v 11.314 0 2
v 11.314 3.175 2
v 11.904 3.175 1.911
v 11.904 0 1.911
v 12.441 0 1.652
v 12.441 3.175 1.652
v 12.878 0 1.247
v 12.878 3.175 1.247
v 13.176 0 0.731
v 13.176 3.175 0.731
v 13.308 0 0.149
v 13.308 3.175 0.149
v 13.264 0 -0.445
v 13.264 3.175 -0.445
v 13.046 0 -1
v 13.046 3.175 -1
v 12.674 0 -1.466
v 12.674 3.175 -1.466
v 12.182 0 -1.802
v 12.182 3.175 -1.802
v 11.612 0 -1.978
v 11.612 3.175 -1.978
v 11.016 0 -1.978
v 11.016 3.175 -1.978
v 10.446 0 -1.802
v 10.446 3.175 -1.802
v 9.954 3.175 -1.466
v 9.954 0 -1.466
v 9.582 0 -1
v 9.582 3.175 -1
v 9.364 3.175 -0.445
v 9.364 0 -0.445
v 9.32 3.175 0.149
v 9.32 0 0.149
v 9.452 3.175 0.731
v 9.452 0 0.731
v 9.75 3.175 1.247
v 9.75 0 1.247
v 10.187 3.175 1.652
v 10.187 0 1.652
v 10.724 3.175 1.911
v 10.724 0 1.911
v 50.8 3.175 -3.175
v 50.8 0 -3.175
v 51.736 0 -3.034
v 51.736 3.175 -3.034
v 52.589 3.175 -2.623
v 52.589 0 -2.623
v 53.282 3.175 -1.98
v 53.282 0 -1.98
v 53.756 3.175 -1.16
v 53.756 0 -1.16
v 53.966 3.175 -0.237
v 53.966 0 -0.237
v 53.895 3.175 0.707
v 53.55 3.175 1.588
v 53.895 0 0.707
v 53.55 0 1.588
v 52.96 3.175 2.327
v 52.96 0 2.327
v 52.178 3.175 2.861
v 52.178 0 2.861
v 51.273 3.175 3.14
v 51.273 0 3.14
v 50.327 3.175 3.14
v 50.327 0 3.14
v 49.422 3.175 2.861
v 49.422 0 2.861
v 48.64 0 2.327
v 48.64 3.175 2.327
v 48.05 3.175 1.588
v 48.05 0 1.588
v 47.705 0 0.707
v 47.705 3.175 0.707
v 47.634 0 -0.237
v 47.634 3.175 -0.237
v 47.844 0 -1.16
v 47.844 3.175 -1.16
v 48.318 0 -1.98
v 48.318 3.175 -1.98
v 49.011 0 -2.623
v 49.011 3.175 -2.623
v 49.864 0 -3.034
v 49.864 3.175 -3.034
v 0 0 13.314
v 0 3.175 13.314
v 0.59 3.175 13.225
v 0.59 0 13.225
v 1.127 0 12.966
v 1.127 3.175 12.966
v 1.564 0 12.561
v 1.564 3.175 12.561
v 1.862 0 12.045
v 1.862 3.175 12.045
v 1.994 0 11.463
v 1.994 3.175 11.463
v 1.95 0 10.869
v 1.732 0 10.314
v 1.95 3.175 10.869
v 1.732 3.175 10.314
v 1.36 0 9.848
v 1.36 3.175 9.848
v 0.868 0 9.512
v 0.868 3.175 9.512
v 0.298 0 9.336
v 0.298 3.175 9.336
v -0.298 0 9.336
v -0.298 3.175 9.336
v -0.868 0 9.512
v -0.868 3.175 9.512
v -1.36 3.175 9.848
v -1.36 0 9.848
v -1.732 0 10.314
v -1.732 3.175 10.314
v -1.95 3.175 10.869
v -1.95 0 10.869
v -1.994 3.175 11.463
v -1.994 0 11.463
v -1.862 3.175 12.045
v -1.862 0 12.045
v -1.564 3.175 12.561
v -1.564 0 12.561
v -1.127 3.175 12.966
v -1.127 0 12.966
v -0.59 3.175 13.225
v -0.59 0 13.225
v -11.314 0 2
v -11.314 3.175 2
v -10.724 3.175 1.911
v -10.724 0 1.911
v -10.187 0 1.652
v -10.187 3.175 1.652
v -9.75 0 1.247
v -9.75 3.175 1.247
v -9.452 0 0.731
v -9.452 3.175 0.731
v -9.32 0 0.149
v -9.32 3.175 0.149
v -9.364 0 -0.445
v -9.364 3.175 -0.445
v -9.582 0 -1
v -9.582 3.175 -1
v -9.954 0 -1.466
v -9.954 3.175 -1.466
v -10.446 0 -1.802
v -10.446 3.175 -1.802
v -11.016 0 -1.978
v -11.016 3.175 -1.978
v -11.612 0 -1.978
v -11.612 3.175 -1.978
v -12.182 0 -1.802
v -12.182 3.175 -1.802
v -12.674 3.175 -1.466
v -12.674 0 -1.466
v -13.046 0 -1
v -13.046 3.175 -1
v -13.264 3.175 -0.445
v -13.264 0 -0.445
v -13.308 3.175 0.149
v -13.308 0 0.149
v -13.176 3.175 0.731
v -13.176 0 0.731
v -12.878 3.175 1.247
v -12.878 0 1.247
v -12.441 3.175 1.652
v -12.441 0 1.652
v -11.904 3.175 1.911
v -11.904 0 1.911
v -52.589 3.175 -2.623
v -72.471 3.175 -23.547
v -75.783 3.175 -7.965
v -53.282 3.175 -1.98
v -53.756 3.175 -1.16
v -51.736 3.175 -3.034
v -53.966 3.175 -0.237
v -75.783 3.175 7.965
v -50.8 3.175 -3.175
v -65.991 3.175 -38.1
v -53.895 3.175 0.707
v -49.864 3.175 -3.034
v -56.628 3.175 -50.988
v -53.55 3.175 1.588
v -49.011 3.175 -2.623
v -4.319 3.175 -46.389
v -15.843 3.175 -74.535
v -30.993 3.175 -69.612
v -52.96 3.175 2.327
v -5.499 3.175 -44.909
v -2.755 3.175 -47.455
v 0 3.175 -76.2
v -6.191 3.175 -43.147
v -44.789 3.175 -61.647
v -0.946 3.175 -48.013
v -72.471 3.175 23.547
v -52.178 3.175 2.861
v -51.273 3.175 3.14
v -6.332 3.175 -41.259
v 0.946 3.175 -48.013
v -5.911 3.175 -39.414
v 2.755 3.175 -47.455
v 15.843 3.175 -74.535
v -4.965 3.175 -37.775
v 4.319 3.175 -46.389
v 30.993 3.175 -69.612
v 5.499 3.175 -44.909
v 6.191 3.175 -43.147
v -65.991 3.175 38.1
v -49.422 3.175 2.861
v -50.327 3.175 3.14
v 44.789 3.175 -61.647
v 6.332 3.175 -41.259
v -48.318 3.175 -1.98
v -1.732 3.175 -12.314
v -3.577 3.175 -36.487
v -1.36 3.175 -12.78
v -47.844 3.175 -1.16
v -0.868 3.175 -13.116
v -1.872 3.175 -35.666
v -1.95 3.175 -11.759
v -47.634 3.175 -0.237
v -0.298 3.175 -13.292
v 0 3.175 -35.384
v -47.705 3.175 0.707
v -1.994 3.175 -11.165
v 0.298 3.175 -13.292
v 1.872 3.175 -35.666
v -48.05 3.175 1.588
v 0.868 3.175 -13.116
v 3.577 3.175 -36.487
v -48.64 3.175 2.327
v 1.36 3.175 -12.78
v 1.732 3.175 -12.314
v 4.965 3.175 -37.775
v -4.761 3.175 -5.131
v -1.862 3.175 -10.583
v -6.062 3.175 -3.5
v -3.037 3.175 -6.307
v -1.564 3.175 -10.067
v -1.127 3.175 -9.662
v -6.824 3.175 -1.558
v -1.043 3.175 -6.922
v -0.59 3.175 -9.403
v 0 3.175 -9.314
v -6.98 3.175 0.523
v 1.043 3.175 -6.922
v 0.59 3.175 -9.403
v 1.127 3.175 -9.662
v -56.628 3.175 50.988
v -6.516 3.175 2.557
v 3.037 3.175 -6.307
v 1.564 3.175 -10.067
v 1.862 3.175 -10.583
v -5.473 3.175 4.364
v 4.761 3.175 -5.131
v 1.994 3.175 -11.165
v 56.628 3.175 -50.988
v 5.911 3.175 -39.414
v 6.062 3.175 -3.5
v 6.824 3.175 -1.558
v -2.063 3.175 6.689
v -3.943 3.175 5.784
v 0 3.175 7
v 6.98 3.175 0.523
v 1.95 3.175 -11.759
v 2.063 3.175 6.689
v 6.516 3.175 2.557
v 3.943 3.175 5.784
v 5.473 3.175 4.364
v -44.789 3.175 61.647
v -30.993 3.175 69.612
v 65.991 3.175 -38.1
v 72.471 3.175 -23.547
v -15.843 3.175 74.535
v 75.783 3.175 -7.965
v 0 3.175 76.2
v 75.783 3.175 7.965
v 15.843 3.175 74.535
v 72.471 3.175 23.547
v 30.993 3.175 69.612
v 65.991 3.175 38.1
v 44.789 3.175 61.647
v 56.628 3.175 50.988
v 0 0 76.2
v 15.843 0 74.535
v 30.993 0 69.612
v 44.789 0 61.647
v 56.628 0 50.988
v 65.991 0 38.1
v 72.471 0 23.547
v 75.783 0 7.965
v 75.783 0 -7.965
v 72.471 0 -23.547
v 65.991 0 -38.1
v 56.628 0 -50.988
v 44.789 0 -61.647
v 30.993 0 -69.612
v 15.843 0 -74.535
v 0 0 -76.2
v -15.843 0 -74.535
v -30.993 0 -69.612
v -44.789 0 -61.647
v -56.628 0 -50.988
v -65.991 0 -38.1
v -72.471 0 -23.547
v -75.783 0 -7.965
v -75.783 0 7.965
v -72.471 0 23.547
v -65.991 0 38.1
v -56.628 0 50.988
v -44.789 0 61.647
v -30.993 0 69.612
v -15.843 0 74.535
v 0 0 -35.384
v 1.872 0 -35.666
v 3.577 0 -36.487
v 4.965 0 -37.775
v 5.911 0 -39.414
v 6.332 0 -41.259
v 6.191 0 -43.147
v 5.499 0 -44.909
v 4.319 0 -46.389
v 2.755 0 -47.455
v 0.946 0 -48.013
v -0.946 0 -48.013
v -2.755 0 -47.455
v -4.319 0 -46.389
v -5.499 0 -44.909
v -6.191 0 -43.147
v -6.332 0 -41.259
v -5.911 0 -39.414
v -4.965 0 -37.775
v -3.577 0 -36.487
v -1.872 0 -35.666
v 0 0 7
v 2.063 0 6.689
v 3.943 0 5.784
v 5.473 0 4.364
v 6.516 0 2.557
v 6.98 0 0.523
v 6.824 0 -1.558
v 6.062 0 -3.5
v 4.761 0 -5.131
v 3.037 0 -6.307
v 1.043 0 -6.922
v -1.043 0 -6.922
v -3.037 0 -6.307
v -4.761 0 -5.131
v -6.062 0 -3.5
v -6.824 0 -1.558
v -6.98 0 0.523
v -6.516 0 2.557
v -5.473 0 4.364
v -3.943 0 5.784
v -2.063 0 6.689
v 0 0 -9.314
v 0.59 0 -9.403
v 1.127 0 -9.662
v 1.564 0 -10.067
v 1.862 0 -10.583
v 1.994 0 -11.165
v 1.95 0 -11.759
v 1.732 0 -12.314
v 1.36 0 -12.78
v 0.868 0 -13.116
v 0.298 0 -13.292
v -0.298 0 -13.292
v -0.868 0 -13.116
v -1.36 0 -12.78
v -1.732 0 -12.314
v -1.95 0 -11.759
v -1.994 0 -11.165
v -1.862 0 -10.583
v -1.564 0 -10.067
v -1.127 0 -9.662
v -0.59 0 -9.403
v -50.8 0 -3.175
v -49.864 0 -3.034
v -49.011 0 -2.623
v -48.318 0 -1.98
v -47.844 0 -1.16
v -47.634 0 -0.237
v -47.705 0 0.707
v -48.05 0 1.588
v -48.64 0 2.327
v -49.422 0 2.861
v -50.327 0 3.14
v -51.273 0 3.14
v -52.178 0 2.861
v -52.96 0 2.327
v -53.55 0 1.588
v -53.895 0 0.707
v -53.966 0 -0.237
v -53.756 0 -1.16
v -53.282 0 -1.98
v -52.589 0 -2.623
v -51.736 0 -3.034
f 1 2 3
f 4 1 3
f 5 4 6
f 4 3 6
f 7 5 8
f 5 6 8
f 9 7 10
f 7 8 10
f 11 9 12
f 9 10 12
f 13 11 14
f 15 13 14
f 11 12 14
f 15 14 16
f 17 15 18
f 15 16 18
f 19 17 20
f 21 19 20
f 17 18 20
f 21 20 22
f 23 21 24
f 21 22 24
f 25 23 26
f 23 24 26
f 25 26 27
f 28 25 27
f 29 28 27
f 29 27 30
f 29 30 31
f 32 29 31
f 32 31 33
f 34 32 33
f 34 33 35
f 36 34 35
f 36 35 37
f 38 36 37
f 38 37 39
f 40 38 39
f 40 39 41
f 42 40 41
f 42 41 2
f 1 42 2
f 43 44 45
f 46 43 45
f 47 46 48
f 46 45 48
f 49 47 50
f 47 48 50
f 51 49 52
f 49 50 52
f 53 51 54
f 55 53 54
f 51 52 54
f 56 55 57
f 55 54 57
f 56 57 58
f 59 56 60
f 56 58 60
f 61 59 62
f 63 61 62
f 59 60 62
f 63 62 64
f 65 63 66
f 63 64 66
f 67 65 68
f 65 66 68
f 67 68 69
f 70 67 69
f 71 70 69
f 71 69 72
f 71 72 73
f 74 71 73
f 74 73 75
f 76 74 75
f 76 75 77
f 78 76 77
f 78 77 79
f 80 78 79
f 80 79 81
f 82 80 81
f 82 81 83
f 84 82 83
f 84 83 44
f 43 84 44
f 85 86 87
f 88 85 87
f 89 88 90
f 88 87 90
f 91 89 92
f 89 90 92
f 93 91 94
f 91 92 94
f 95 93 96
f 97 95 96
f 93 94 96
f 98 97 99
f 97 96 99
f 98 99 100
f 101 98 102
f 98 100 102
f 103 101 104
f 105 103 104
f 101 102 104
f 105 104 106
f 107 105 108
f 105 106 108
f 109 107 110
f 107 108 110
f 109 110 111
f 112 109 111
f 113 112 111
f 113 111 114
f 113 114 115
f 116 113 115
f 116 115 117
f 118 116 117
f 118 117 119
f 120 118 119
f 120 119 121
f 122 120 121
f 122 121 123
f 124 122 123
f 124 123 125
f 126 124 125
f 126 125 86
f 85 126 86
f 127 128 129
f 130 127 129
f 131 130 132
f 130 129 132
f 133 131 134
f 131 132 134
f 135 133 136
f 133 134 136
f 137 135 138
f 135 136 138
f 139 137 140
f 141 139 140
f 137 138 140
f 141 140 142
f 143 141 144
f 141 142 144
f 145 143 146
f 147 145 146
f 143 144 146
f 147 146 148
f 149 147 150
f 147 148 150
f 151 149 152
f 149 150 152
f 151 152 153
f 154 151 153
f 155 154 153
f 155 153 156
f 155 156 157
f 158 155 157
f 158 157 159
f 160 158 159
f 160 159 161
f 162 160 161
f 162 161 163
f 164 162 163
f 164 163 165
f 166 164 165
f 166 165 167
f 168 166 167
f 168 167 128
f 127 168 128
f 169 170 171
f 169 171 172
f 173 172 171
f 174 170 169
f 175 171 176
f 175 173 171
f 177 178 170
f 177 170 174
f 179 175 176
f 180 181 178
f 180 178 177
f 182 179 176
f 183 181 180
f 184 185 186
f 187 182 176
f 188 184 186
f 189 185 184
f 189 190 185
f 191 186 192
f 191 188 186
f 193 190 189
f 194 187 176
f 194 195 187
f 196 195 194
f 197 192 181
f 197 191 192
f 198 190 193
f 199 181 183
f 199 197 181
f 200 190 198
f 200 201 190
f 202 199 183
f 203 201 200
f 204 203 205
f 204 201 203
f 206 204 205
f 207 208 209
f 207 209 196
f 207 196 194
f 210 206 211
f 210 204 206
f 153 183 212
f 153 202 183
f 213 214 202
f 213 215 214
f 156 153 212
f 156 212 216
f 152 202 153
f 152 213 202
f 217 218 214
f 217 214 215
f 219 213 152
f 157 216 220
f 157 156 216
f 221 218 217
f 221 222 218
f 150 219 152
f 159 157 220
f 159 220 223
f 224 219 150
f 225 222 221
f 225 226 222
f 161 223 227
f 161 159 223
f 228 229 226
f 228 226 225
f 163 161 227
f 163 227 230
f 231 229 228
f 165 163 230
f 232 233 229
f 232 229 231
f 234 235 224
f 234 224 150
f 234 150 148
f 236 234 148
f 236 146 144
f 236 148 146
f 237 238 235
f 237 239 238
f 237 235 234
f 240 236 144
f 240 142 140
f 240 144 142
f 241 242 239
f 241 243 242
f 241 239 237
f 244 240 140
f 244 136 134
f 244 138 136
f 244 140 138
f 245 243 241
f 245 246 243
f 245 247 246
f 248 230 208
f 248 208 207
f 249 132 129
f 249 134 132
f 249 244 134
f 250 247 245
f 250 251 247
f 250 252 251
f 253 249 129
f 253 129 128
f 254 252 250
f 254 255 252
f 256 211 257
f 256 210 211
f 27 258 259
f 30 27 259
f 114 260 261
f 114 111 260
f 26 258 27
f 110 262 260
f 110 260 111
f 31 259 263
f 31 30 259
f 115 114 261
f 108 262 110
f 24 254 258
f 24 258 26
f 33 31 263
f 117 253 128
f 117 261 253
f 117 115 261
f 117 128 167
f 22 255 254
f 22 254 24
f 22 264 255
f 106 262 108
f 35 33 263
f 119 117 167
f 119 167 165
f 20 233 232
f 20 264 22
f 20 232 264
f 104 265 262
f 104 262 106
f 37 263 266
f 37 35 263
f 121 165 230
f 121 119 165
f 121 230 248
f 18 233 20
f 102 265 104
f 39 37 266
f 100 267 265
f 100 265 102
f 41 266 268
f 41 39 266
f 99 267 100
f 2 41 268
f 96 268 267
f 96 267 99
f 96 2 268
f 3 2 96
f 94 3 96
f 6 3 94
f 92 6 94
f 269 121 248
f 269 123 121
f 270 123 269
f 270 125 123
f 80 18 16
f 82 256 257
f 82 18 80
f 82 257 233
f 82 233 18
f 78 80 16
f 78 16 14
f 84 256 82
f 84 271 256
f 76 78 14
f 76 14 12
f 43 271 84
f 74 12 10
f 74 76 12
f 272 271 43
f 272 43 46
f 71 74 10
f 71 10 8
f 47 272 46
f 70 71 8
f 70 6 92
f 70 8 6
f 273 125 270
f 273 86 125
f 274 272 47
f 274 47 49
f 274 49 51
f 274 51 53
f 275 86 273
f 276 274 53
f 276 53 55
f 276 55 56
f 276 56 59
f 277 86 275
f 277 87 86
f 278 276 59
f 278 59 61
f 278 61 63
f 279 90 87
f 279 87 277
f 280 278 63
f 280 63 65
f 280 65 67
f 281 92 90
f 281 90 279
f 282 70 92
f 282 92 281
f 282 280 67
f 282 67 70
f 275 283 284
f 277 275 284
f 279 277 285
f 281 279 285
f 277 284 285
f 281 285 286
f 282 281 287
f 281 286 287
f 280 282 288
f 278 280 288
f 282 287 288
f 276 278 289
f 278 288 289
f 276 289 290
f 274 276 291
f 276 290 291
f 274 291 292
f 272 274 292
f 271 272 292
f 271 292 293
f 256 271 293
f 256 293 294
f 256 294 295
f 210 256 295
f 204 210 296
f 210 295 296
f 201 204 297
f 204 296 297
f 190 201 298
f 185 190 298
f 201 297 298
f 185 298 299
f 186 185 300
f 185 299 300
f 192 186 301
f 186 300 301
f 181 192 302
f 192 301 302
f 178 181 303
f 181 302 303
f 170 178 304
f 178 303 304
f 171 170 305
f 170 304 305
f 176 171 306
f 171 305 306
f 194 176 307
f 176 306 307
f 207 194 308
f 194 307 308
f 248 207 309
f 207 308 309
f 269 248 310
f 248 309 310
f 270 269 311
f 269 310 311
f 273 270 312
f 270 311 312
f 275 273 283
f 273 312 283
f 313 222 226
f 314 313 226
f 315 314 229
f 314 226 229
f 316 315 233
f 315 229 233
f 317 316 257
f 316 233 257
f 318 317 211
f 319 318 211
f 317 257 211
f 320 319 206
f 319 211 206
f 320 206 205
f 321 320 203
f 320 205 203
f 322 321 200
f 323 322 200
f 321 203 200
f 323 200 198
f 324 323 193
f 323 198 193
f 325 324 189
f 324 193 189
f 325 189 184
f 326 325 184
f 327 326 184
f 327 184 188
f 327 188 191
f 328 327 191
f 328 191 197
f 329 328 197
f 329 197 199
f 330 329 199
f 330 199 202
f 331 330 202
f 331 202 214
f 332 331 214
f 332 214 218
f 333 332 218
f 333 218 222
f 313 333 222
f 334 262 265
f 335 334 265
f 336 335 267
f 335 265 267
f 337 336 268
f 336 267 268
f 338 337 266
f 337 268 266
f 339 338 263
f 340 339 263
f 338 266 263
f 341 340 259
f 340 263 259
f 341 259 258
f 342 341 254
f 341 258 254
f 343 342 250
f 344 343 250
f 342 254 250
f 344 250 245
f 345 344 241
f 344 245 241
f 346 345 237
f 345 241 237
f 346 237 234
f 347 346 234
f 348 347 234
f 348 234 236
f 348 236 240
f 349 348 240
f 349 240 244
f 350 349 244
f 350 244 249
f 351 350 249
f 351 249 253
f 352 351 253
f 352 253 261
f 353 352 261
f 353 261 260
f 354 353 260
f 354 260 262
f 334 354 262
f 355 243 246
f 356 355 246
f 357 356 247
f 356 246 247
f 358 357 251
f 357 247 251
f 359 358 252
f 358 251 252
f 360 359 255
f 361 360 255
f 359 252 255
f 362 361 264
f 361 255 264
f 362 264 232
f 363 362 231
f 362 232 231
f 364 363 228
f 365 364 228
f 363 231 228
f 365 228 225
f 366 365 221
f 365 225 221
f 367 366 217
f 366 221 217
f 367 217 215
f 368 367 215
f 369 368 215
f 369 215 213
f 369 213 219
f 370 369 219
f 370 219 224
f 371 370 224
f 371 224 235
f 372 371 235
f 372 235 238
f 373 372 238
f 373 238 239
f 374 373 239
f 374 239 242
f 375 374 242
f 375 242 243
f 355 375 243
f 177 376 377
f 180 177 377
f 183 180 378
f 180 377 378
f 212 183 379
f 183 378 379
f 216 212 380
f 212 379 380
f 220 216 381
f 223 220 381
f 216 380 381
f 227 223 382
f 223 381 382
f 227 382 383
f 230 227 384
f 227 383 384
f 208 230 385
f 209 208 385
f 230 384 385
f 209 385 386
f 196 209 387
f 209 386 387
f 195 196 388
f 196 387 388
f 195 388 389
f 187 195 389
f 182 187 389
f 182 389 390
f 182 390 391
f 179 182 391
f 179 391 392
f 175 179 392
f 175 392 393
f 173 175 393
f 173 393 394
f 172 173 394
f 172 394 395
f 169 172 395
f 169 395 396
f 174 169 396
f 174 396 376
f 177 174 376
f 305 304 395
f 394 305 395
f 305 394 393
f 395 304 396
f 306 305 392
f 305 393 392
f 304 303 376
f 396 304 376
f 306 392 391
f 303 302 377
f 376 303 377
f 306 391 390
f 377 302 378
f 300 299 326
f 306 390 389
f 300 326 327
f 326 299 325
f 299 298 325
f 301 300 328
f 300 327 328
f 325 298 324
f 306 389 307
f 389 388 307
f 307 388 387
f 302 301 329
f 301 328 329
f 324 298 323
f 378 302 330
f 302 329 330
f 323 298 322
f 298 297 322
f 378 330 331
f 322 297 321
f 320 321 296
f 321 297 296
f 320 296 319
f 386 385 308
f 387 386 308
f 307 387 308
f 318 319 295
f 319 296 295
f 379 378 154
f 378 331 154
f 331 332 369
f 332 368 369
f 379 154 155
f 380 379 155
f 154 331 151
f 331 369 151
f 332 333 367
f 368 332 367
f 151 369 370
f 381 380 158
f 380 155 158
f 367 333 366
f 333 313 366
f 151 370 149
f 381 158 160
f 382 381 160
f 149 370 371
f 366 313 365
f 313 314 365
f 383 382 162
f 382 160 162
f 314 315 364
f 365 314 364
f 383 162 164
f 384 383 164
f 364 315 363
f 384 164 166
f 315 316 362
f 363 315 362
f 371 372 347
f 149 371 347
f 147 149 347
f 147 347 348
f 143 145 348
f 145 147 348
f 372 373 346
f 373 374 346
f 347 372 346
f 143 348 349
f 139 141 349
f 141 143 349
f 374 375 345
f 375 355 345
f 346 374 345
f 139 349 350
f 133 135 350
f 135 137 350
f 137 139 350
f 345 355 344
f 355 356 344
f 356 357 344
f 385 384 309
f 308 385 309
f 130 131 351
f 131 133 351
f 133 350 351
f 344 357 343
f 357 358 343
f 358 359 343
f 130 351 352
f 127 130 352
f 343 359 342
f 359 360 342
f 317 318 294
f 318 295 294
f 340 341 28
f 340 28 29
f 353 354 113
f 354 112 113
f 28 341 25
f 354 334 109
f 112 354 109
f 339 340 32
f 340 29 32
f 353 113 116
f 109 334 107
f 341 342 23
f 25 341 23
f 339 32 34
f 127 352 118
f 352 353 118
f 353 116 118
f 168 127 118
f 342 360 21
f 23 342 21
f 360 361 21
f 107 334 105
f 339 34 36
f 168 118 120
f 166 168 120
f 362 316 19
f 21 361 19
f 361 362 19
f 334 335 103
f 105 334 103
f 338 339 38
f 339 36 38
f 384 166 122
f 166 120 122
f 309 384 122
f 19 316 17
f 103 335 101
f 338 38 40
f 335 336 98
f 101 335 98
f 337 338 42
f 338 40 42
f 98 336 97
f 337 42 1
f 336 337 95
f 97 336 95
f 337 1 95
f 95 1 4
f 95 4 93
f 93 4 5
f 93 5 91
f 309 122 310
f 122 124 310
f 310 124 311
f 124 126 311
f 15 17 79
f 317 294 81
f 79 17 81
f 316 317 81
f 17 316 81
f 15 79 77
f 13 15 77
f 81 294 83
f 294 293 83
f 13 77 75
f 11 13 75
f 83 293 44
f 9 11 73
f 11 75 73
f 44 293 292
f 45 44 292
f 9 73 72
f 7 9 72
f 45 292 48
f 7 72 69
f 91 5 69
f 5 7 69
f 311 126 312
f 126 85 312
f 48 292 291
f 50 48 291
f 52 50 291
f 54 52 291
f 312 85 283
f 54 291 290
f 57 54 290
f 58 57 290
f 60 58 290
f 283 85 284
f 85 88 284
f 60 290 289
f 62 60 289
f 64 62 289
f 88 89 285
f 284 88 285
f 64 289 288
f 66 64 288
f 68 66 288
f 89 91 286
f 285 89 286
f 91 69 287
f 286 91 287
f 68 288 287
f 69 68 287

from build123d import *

# Parameters (mm, degrees)
SKETCH1_R           = 76.2
BOSS_EXTRUDE1_DEPTH = 3.175
SKETCH2_R           = 7
CUT_EXTRUDE1_DEPTH  = 108.809835474
SKETCH3_R           = 2
CUT_EXTRUDE2_DEPTH  = 108.809835474
SKETCH4_R           = 3.175
CUT_EXTRUDE3_DEPTH  = 108.809835474
CUT_EXTRUDE4_REACH  = 109.81
SKETCH5_R           = 6.35


with BuildPart() as part:
    # Sketch1 → Boss-Extrude1 (new body)
    with BuildSketch(Plane(origin=(0, 0, 0), x_dir=(1, 0, 0), z_dir=(0, 1, 0))):
        with Locations(Location((0, 0, 0), (0, 0, 270))):
            Circle(SKETCH1_R)
    extrude(amount=BOSS_EXTRUDE1_DEPTH)

    # Sketch2 → Cut-Extrude1 (cut, through all)
    with BuildSketch(Plane(origin=(0, 3.175, 0), x_dir=(1, 0, 0), z_dir=(0, 1, 0))):
        with Locations(Location((0, 0, 0), (0, 0, 270))):
            Circle(SKETCH2_R)
    extrude(amount=-CUT_EXTRUDE1_DEPTH, mode=Mode.SUBTRACT)

    # Sketch3 → Cut-Extrude2 (cut, through all)
    with BuildSketch(Plane(origin=(0, 3.175, 0), x_dir=(1, 0, 0), z_dir=(0, 1, 0))):
        with Locations(Location((11.314, 0, 0), (0, 0, 270))):
            Circle(SKETCH3_R)
        with Locations(Location((0, -11.314, 0), (0, 0, 270))):
            Circle(SKETCH3_R)
        with Locations(Location((-11.314, 0, 0), (0, 0, 270))):
            Circle(SKETCH3_R)
        with Locations(Location((0, 11.314, 0), (0, 0, 270))):
            Circle(SKETCH3_R)
    extrude(amount=-CUT_EXTRUDE2_DEPTH, mode=Mode.SUBTRACT)

    # Sketch4 → Cut-Extrude3 (cut, through all)
    with BuildSketch(Plane.XZ):
        with Locations(Location((-50.8, 0, 0), (0, 0, 270))):
            Circle(SKETCH4_R)
        with Locations(Location((50.8, 0, 0), (0, 0, 270))):
            Circle(SKETCH4_R)
    extrude(amount=-CUT_EXTRUDE3_DEPTH, mode=Mode.SUBTRACT)

    # Sketch5 → Cut-Extrude4 (cut, up to next)
    with BuildSketch(Plane(origin=(0, 3.175, 0), x_dir=(1, 0, 0), z_dir=(0, 1, 0)), mode=Mode.PRIVATE) as cut_extrude4_sk1:
        with Locations(Location((0, 41.73382544, 0), (0, 0, 270))):
            Circle(SKETCH5_R)
    cut_extrude4_tool1 = extrude(cut_extrude4_sk1.sketch, amount=-CUT_EXTRUDE4_REACH, mode=Mode.PRIVATE) & part.part
    add(cut_extrude4_tool1.solids().sort_by_distance((0, 3.175, -41.733825))[0], mode=Mode.SUBTRACT)


solid = part.part
